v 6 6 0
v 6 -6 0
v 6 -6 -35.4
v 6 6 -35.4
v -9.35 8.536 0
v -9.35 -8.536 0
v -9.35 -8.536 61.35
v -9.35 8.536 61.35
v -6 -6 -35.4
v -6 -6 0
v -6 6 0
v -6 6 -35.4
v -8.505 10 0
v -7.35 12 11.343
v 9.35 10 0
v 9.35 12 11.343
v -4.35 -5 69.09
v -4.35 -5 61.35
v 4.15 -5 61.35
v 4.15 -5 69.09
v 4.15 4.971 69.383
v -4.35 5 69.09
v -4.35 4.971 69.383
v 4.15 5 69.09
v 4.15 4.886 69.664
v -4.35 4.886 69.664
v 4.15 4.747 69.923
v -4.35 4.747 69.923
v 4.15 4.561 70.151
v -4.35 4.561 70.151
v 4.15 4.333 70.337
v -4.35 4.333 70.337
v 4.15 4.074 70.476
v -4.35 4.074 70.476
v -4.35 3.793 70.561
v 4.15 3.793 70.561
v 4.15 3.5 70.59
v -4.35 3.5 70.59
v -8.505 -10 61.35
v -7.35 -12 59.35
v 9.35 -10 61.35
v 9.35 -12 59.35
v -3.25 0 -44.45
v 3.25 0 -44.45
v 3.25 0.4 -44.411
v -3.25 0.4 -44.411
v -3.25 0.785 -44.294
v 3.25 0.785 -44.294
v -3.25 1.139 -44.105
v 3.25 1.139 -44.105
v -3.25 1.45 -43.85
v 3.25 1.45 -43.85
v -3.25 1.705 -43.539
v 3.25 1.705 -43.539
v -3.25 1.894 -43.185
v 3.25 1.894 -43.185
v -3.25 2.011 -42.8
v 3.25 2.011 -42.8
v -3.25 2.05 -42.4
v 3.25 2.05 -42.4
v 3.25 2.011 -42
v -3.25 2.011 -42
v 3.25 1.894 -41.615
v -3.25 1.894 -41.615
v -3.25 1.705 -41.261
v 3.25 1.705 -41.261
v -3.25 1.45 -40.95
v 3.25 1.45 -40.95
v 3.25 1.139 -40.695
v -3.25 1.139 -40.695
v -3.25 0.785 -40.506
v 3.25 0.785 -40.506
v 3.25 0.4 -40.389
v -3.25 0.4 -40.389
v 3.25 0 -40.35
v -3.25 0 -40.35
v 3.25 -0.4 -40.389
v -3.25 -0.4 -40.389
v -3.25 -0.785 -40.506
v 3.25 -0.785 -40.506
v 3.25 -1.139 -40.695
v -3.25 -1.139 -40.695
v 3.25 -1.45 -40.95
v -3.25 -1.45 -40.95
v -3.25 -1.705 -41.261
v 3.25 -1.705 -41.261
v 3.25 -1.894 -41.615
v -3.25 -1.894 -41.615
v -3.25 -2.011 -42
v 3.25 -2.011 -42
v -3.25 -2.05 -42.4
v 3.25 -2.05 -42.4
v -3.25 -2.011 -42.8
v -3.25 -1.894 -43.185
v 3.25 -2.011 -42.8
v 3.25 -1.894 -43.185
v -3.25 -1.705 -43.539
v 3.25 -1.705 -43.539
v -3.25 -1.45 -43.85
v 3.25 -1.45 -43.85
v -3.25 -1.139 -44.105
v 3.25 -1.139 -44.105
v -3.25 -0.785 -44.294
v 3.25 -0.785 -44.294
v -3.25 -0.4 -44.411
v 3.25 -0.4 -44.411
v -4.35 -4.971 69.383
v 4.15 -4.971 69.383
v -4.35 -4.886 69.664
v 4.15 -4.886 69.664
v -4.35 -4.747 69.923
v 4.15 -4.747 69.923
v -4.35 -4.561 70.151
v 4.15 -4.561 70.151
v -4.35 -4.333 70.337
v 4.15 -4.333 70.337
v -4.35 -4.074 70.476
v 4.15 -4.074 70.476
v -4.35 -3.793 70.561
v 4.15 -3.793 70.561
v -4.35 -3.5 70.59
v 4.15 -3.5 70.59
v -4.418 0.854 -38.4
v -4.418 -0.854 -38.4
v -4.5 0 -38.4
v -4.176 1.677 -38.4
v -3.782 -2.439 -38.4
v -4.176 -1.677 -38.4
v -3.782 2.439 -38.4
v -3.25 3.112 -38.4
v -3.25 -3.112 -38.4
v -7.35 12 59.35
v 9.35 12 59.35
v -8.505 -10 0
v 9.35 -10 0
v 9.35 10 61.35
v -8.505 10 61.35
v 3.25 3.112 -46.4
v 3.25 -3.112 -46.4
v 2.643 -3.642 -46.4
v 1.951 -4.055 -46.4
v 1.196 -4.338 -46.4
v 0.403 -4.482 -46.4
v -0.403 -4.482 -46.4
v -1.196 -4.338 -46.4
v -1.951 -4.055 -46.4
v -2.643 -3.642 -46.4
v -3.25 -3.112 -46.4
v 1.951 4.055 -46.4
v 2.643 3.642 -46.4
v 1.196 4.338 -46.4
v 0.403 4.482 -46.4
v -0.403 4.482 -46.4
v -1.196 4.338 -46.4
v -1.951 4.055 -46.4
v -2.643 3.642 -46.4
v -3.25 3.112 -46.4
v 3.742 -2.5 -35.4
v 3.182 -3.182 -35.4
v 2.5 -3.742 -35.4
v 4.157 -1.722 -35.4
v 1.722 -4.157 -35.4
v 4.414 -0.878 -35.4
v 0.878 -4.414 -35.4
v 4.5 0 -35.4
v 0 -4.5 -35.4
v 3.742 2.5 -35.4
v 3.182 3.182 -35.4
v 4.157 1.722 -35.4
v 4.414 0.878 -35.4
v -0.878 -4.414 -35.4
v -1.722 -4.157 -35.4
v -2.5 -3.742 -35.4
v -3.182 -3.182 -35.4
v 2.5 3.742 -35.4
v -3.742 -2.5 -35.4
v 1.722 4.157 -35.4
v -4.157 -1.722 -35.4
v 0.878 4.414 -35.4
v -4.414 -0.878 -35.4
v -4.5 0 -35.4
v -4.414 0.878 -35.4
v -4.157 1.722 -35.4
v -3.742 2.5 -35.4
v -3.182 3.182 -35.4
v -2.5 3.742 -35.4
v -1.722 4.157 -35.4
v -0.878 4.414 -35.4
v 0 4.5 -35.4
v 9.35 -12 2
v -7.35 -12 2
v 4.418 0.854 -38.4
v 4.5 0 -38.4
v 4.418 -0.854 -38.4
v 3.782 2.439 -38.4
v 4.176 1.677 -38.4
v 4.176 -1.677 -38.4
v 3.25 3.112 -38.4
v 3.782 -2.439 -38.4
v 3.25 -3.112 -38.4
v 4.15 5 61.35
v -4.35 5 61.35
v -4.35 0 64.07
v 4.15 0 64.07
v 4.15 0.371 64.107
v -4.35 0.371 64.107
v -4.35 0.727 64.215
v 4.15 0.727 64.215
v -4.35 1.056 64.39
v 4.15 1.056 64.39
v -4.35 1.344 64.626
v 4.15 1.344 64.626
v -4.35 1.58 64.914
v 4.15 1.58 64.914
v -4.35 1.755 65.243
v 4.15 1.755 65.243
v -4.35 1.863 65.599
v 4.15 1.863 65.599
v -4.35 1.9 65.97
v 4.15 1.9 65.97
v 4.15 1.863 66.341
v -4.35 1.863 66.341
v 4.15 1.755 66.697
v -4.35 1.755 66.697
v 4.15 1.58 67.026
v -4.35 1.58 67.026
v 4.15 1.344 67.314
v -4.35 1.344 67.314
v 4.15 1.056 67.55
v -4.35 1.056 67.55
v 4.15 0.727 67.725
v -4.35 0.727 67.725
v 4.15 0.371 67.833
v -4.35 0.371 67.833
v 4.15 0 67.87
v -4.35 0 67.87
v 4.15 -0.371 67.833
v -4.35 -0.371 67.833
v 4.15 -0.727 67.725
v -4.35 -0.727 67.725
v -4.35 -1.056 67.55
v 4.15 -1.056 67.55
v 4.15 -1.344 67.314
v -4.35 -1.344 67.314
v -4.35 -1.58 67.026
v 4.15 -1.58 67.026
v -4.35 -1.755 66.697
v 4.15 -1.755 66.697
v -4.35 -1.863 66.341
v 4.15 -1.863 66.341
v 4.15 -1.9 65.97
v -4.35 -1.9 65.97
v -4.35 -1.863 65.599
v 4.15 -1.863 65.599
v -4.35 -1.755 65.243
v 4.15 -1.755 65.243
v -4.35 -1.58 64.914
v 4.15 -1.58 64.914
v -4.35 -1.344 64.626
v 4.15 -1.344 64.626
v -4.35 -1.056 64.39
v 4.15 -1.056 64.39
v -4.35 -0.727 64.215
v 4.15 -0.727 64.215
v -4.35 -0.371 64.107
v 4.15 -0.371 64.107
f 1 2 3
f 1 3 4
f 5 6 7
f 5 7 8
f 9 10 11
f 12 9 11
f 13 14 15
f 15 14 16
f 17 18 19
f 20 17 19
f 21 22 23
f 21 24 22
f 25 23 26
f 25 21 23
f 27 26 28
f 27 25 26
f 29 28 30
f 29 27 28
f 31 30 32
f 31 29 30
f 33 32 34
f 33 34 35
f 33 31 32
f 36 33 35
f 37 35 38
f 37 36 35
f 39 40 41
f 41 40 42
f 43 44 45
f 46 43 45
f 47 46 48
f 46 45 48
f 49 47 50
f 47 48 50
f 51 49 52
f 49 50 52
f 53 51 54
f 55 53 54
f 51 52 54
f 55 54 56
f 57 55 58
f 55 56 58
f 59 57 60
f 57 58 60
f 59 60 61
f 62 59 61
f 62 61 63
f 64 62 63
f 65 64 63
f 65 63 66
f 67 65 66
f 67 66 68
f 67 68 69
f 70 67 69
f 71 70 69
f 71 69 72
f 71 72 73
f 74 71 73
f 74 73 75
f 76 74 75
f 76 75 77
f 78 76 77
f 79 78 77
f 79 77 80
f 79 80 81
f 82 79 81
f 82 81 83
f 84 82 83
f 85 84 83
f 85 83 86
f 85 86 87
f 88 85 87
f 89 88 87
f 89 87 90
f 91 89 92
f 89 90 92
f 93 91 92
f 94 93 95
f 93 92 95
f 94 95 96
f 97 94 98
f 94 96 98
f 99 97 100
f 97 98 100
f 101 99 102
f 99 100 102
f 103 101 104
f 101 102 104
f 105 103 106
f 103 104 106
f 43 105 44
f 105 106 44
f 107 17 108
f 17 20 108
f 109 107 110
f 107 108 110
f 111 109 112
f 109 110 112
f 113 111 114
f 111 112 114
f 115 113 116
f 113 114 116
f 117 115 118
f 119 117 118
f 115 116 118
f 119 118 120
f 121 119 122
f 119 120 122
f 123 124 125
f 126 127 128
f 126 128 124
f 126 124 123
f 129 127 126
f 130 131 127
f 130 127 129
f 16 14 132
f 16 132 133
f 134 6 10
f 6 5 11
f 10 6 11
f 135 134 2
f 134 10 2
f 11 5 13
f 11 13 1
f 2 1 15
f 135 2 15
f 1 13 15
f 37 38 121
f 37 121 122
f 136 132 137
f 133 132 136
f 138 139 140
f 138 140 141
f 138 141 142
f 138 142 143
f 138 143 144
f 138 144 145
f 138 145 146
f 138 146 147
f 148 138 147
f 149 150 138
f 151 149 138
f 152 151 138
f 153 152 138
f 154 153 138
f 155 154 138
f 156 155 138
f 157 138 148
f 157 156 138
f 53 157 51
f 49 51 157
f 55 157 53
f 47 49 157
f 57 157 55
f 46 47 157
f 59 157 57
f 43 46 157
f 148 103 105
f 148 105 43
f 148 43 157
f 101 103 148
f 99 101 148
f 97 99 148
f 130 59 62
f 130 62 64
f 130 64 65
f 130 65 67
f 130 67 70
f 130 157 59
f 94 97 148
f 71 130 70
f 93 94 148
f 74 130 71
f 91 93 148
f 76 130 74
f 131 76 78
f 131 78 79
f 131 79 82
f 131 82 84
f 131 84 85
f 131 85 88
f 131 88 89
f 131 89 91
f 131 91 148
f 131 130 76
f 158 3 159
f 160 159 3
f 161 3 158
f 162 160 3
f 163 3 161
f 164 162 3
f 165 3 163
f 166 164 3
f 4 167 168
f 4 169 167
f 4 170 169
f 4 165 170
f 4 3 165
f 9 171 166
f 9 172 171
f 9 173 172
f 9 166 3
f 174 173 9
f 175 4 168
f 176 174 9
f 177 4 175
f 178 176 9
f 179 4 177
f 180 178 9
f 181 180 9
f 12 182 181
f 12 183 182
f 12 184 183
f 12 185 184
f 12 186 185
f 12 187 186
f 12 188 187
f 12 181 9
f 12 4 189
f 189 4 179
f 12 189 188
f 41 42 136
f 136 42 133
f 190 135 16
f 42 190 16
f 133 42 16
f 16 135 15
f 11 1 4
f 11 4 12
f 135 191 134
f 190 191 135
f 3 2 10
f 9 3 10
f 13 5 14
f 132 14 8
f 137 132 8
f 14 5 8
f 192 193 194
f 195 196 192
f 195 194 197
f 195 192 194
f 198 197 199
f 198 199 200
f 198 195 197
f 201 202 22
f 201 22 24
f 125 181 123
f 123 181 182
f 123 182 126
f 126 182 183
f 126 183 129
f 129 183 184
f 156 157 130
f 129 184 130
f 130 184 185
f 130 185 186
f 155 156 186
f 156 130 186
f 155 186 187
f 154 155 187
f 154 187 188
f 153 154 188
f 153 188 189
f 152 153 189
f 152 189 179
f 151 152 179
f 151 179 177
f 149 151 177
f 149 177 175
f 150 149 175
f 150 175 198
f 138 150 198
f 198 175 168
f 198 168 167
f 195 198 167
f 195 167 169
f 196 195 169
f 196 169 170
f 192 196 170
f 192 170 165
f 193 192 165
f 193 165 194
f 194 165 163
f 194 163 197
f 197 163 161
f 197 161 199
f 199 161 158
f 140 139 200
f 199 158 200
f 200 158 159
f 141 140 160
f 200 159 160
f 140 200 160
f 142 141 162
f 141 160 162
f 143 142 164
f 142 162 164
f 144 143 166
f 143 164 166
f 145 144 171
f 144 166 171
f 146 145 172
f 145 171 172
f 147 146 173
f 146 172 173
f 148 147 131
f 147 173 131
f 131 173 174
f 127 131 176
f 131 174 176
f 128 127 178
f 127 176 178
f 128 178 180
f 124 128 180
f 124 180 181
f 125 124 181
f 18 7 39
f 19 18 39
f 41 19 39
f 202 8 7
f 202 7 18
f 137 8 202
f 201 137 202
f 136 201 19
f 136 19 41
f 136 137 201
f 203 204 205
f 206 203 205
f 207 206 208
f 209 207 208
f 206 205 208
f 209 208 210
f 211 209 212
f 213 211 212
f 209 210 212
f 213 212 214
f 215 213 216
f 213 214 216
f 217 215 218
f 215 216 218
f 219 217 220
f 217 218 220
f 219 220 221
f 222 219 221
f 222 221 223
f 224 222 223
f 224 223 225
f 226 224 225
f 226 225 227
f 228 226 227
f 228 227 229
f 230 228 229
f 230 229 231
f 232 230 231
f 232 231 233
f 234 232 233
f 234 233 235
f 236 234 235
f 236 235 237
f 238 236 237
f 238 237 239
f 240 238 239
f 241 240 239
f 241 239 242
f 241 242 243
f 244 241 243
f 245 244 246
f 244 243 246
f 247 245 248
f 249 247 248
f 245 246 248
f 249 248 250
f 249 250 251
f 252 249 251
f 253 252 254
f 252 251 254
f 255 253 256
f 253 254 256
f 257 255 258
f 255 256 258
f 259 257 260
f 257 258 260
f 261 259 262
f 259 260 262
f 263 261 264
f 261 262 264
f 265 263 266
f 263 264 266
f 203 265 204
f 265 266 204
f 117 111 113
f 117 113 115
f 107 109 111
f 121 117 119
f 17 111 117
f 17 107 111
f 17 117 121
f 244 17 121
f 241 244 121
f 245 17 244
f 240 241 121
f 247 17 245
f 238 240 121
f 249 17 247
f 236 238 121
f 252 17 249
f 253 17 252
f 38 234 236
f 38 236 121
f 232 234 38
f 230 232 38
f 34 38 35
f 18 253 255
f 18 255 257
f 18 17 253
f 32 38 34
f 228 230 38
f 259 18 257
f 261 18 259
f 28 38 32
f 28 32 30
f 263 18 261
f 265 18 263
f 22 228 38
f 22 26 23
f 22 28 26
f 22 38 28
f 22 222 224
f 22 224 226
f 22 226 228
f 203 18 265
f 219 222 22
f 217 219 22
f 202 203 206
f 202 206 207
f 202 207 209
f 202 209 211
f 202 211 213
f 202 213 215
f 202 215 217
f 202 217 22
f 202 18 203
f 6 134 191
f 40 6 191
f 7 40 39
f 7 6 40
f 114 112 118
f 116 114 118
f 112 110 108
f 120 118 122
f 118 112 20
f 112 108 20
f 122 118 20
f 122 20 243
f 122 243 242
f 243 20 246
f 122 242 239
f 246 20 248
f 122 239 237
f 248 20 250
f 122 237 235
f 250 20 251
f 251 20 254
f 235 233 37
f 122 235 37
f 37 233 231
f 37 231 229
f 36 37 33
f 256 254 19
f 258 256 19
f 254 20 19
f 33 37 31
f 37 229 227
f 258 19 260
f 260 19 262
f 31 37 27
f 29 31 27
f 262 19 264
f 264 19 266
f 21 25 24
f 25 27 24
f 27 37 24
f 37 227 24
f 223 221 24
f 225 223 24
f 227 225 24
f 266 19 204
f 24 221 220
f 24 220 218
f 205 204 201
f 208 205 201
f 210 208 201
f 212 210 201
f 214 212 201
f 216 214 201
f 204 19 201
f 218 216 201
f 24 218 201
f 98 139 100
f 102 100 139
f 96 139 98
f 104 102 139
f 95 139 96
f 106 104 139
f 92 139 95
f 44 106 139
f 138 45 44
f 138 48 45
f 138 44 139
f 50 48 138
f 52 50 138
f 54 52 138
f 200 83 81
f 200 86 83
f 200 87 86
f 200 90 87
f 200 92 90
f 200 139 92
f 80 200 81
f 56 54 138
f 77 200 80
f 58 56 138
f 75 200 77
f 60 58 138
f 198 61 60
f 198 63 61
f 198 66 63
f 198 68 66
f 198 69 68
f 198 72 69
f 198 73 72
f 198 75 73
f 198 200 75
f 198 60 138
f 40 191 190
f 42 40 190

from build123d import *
from OCP.BRepFilletAPI import BRepFilletAPI_MakeChamfer

# Parameters (mm, degrees)
SKETCH1_W           = 18.7
SKETCH1_H           = 24
BOSS_EXTRUDE1_DEPTH = 61.35
CHAMFER1_SIZE       = 2
CHAMFER1_SIZE2      = 3.464101615
CHAMFER2_SIZE       = 2
CHAMFER3_SIZE       = 2
CHAMFER3_SIZE2      = 11.342563639
SKETCH2_W           = 12
SKETCH2_H           = 12
BOSS_EXTRUDE2_DEPTH = 35.4
SKETCH3_R           = 4.5
BOSS_EXTRUDE3_DEPTH = 11
CUT_EXTRUDE1_START  = -8
CUT_EXTRUDE1_DEPTH  = 8
SKETCH5_W           = 8.5
SKETCH5_H           = 10
BOSS_EXTRUDE4_DEPTH = 9.24
SKETCH7_R           = 1.9
CUT_EXTRUDE2_DEPTH  = 10
FILLET1_R           = 1.5
SKETCH8_R           = 2.05
CUT_EXTRUDE3_DEPTH  = 73.702875459


with BuildPart() as part:
    # Sketch1 → Boss-Extrude1 (new body)
    with BuildSketch(Plane.XY):
        Rectangle(SKETCH1_W, SKETCH1_H)
    extrude(amount=BOSS_EXTRUDE1_DEPTH)

    # Chamfer1: one chamfer whose edges measure the first distance from different faces: ONE call of the kernel's chamfer builder (chamfer() names one face for all edges)
    chamfer1_edges_1 = [part.edges().sort_by_distance(p)[0] for p in [
        (-9.35, 12, 30.675),
    ]]
    chamfer1_side_1 = [part.faces().sort_by_distance(p)[0] for p in [
        (0, 12, 30.675),
    ]]
    chamfer1_edges_2 = [part.edges().sort_by_distance(p)[0] for p in [
        (-9.35, -12, 30.675),
    ]]
    chamfer1_side_2 = [part.faces().sort_by_distance(p)[0] for p in [
        (0, -12, 30.675),
    ]]
    chamfer1 = BRepFilletAPI_MakeChamfer(part.part.solid().wrapped)
    for e in chamfer1_edges_1:
        chamfer1.Add(CHAMFER1_SIZE, CHAMFER1_SIZE2, e.wrapped, chamfer1_side_1[0].wrapped)  # the first distance lies on this face
    for e in chamfer1_edges_2:
        chamfer1.Add(CHAMFER1_SIZE, CHAMFER1_SIZE2, e.wrapped, chamfer1_side_2[0].wrapped)  # the first distance lies on this face
    add(Compound.cast(chamfer1.Shape()), mode=Mode.REPLACE)

    # Chamfer2
    chamfer2_edges = [part.edges().sort_by_distance(p)[0] for p in [
        (1, -12, 0),
        (1, 12, 61.35),
        (1, -12, 61.35),
    ]]
    chamfer(chamfer2_edges, length=CHAMFER2_SIZE)

    # Chamfer3
    chamfer3_edges = [part.edges().sort_by_distance(p)[0] for p in [
        (1, 12, 0),
    ]]
    chamfer3_side = [part.faces().sort_by_distance(p)[0] for p in [
        (0.087625567, 0.932238812, 0),
    ]]
    chamfer(chamfer3_edges, length=CHAMFER3_SIZE, length2=CHAMFER3_SIZE2, reference=chamfer3_side[0])

    # Sketch2 → Boss-Extrude2 (add)
    with BuildSketch(Plane(origin=(0, 0, 0), x_dir=(-1, 0, 0), z_dir=(0, 0, -1))):
        Rectangle(SKETCH2_W, SKETCH2_H)
    extrude(amount=BOSS_EXTRUDE2_DEPTH)

    # Sketch3 → Boss-Extrude3 (add)
    with BuildSketch(Plane(origin=(0, 0, -35.4), x_dir=(-1, 0, 0), z_dir=(0, 0, -1))):
        Circle(SKETCH3_R)
    extrude(amount=BOSS_EXTRUDE3_DEPTH)

    # Sketch4 → Cut-Extrude1 (cut)
    with BuildSketch(Plane(origin=(0, 0, -46.4), x_dir=(-1, 0, 0), z_dir=(0, 0, -1)).offset(CUT_EXTRUDE1_START)):
        with BuildLine():
            ThreePointArc((-3.25, 3.112474899), (-4.5, 0), (-3.25, -3.112474899))
            Line((-3.25, -3.112474899), (-3.25, 3.112474899))
        make_face()
        with BuildLine():
            Line((3.25, 3.112474899), (3.25, -3.112474899))
            ThreePointArc((3.25, -3.112474899), (4.175823272, -1.677050983), (4.5, 0))
            ThreePointArc((4.5, 0), (4.175823272, 1.677050983), (3.25, 3.112474899))
        make_face()
    extrude(amount=CUT_EXTRUDE1_DEPTH, mode=Mode.SUBTRACT)

    # Sketch5 → Boss-Extrude4 (add)
    with BuildSketch(Plane.XY.offset(61.35)):
        with Locations((-0.1, 0)):
            Rectangle(SKETCH5_W, SKETCH5_H)
    extrude(amount=BOSS_EXTRUDE4_DEPTH)

    # Sketch7 → Cut-Extrude2 (cut)
    with BuildSketch(Plane(origin=(4.15, 0, 0), x_dir=(0, 0, -1), z_dir=(1, 0, 0))):
        with Locations((-65.97, 0)):
            Circle(SKETCH7_R)
    extrude(amount=-CUT_EXTRUDE2_DEPTH, mode=Mode.SUBTRACT)

    # Fillet1
    fillet1_edges = [part.edges().sort_by_distance(p)[0] for p in [
        (-0.1, 5, 70.59),
        (-0.1, -5, 70.59),
    ]]
    fillet(fillet1_edges, radius=FILLET1_R)

    # Sketch8 → Cut-Extrude3 (cut, through all)
    with BuildSketch(Plane(origin=(3.25, 0, 0), x_dir=(0, 0, -1), z_dir=(1, 0, 0))):
        with Locations((42.4, 0)):
            Circle(SKETCH8_R)
    extrude(amount=-CUT_EXTRUDE3_DEPTH, mode=Mode.SUBTRACT)


solid = part.part
